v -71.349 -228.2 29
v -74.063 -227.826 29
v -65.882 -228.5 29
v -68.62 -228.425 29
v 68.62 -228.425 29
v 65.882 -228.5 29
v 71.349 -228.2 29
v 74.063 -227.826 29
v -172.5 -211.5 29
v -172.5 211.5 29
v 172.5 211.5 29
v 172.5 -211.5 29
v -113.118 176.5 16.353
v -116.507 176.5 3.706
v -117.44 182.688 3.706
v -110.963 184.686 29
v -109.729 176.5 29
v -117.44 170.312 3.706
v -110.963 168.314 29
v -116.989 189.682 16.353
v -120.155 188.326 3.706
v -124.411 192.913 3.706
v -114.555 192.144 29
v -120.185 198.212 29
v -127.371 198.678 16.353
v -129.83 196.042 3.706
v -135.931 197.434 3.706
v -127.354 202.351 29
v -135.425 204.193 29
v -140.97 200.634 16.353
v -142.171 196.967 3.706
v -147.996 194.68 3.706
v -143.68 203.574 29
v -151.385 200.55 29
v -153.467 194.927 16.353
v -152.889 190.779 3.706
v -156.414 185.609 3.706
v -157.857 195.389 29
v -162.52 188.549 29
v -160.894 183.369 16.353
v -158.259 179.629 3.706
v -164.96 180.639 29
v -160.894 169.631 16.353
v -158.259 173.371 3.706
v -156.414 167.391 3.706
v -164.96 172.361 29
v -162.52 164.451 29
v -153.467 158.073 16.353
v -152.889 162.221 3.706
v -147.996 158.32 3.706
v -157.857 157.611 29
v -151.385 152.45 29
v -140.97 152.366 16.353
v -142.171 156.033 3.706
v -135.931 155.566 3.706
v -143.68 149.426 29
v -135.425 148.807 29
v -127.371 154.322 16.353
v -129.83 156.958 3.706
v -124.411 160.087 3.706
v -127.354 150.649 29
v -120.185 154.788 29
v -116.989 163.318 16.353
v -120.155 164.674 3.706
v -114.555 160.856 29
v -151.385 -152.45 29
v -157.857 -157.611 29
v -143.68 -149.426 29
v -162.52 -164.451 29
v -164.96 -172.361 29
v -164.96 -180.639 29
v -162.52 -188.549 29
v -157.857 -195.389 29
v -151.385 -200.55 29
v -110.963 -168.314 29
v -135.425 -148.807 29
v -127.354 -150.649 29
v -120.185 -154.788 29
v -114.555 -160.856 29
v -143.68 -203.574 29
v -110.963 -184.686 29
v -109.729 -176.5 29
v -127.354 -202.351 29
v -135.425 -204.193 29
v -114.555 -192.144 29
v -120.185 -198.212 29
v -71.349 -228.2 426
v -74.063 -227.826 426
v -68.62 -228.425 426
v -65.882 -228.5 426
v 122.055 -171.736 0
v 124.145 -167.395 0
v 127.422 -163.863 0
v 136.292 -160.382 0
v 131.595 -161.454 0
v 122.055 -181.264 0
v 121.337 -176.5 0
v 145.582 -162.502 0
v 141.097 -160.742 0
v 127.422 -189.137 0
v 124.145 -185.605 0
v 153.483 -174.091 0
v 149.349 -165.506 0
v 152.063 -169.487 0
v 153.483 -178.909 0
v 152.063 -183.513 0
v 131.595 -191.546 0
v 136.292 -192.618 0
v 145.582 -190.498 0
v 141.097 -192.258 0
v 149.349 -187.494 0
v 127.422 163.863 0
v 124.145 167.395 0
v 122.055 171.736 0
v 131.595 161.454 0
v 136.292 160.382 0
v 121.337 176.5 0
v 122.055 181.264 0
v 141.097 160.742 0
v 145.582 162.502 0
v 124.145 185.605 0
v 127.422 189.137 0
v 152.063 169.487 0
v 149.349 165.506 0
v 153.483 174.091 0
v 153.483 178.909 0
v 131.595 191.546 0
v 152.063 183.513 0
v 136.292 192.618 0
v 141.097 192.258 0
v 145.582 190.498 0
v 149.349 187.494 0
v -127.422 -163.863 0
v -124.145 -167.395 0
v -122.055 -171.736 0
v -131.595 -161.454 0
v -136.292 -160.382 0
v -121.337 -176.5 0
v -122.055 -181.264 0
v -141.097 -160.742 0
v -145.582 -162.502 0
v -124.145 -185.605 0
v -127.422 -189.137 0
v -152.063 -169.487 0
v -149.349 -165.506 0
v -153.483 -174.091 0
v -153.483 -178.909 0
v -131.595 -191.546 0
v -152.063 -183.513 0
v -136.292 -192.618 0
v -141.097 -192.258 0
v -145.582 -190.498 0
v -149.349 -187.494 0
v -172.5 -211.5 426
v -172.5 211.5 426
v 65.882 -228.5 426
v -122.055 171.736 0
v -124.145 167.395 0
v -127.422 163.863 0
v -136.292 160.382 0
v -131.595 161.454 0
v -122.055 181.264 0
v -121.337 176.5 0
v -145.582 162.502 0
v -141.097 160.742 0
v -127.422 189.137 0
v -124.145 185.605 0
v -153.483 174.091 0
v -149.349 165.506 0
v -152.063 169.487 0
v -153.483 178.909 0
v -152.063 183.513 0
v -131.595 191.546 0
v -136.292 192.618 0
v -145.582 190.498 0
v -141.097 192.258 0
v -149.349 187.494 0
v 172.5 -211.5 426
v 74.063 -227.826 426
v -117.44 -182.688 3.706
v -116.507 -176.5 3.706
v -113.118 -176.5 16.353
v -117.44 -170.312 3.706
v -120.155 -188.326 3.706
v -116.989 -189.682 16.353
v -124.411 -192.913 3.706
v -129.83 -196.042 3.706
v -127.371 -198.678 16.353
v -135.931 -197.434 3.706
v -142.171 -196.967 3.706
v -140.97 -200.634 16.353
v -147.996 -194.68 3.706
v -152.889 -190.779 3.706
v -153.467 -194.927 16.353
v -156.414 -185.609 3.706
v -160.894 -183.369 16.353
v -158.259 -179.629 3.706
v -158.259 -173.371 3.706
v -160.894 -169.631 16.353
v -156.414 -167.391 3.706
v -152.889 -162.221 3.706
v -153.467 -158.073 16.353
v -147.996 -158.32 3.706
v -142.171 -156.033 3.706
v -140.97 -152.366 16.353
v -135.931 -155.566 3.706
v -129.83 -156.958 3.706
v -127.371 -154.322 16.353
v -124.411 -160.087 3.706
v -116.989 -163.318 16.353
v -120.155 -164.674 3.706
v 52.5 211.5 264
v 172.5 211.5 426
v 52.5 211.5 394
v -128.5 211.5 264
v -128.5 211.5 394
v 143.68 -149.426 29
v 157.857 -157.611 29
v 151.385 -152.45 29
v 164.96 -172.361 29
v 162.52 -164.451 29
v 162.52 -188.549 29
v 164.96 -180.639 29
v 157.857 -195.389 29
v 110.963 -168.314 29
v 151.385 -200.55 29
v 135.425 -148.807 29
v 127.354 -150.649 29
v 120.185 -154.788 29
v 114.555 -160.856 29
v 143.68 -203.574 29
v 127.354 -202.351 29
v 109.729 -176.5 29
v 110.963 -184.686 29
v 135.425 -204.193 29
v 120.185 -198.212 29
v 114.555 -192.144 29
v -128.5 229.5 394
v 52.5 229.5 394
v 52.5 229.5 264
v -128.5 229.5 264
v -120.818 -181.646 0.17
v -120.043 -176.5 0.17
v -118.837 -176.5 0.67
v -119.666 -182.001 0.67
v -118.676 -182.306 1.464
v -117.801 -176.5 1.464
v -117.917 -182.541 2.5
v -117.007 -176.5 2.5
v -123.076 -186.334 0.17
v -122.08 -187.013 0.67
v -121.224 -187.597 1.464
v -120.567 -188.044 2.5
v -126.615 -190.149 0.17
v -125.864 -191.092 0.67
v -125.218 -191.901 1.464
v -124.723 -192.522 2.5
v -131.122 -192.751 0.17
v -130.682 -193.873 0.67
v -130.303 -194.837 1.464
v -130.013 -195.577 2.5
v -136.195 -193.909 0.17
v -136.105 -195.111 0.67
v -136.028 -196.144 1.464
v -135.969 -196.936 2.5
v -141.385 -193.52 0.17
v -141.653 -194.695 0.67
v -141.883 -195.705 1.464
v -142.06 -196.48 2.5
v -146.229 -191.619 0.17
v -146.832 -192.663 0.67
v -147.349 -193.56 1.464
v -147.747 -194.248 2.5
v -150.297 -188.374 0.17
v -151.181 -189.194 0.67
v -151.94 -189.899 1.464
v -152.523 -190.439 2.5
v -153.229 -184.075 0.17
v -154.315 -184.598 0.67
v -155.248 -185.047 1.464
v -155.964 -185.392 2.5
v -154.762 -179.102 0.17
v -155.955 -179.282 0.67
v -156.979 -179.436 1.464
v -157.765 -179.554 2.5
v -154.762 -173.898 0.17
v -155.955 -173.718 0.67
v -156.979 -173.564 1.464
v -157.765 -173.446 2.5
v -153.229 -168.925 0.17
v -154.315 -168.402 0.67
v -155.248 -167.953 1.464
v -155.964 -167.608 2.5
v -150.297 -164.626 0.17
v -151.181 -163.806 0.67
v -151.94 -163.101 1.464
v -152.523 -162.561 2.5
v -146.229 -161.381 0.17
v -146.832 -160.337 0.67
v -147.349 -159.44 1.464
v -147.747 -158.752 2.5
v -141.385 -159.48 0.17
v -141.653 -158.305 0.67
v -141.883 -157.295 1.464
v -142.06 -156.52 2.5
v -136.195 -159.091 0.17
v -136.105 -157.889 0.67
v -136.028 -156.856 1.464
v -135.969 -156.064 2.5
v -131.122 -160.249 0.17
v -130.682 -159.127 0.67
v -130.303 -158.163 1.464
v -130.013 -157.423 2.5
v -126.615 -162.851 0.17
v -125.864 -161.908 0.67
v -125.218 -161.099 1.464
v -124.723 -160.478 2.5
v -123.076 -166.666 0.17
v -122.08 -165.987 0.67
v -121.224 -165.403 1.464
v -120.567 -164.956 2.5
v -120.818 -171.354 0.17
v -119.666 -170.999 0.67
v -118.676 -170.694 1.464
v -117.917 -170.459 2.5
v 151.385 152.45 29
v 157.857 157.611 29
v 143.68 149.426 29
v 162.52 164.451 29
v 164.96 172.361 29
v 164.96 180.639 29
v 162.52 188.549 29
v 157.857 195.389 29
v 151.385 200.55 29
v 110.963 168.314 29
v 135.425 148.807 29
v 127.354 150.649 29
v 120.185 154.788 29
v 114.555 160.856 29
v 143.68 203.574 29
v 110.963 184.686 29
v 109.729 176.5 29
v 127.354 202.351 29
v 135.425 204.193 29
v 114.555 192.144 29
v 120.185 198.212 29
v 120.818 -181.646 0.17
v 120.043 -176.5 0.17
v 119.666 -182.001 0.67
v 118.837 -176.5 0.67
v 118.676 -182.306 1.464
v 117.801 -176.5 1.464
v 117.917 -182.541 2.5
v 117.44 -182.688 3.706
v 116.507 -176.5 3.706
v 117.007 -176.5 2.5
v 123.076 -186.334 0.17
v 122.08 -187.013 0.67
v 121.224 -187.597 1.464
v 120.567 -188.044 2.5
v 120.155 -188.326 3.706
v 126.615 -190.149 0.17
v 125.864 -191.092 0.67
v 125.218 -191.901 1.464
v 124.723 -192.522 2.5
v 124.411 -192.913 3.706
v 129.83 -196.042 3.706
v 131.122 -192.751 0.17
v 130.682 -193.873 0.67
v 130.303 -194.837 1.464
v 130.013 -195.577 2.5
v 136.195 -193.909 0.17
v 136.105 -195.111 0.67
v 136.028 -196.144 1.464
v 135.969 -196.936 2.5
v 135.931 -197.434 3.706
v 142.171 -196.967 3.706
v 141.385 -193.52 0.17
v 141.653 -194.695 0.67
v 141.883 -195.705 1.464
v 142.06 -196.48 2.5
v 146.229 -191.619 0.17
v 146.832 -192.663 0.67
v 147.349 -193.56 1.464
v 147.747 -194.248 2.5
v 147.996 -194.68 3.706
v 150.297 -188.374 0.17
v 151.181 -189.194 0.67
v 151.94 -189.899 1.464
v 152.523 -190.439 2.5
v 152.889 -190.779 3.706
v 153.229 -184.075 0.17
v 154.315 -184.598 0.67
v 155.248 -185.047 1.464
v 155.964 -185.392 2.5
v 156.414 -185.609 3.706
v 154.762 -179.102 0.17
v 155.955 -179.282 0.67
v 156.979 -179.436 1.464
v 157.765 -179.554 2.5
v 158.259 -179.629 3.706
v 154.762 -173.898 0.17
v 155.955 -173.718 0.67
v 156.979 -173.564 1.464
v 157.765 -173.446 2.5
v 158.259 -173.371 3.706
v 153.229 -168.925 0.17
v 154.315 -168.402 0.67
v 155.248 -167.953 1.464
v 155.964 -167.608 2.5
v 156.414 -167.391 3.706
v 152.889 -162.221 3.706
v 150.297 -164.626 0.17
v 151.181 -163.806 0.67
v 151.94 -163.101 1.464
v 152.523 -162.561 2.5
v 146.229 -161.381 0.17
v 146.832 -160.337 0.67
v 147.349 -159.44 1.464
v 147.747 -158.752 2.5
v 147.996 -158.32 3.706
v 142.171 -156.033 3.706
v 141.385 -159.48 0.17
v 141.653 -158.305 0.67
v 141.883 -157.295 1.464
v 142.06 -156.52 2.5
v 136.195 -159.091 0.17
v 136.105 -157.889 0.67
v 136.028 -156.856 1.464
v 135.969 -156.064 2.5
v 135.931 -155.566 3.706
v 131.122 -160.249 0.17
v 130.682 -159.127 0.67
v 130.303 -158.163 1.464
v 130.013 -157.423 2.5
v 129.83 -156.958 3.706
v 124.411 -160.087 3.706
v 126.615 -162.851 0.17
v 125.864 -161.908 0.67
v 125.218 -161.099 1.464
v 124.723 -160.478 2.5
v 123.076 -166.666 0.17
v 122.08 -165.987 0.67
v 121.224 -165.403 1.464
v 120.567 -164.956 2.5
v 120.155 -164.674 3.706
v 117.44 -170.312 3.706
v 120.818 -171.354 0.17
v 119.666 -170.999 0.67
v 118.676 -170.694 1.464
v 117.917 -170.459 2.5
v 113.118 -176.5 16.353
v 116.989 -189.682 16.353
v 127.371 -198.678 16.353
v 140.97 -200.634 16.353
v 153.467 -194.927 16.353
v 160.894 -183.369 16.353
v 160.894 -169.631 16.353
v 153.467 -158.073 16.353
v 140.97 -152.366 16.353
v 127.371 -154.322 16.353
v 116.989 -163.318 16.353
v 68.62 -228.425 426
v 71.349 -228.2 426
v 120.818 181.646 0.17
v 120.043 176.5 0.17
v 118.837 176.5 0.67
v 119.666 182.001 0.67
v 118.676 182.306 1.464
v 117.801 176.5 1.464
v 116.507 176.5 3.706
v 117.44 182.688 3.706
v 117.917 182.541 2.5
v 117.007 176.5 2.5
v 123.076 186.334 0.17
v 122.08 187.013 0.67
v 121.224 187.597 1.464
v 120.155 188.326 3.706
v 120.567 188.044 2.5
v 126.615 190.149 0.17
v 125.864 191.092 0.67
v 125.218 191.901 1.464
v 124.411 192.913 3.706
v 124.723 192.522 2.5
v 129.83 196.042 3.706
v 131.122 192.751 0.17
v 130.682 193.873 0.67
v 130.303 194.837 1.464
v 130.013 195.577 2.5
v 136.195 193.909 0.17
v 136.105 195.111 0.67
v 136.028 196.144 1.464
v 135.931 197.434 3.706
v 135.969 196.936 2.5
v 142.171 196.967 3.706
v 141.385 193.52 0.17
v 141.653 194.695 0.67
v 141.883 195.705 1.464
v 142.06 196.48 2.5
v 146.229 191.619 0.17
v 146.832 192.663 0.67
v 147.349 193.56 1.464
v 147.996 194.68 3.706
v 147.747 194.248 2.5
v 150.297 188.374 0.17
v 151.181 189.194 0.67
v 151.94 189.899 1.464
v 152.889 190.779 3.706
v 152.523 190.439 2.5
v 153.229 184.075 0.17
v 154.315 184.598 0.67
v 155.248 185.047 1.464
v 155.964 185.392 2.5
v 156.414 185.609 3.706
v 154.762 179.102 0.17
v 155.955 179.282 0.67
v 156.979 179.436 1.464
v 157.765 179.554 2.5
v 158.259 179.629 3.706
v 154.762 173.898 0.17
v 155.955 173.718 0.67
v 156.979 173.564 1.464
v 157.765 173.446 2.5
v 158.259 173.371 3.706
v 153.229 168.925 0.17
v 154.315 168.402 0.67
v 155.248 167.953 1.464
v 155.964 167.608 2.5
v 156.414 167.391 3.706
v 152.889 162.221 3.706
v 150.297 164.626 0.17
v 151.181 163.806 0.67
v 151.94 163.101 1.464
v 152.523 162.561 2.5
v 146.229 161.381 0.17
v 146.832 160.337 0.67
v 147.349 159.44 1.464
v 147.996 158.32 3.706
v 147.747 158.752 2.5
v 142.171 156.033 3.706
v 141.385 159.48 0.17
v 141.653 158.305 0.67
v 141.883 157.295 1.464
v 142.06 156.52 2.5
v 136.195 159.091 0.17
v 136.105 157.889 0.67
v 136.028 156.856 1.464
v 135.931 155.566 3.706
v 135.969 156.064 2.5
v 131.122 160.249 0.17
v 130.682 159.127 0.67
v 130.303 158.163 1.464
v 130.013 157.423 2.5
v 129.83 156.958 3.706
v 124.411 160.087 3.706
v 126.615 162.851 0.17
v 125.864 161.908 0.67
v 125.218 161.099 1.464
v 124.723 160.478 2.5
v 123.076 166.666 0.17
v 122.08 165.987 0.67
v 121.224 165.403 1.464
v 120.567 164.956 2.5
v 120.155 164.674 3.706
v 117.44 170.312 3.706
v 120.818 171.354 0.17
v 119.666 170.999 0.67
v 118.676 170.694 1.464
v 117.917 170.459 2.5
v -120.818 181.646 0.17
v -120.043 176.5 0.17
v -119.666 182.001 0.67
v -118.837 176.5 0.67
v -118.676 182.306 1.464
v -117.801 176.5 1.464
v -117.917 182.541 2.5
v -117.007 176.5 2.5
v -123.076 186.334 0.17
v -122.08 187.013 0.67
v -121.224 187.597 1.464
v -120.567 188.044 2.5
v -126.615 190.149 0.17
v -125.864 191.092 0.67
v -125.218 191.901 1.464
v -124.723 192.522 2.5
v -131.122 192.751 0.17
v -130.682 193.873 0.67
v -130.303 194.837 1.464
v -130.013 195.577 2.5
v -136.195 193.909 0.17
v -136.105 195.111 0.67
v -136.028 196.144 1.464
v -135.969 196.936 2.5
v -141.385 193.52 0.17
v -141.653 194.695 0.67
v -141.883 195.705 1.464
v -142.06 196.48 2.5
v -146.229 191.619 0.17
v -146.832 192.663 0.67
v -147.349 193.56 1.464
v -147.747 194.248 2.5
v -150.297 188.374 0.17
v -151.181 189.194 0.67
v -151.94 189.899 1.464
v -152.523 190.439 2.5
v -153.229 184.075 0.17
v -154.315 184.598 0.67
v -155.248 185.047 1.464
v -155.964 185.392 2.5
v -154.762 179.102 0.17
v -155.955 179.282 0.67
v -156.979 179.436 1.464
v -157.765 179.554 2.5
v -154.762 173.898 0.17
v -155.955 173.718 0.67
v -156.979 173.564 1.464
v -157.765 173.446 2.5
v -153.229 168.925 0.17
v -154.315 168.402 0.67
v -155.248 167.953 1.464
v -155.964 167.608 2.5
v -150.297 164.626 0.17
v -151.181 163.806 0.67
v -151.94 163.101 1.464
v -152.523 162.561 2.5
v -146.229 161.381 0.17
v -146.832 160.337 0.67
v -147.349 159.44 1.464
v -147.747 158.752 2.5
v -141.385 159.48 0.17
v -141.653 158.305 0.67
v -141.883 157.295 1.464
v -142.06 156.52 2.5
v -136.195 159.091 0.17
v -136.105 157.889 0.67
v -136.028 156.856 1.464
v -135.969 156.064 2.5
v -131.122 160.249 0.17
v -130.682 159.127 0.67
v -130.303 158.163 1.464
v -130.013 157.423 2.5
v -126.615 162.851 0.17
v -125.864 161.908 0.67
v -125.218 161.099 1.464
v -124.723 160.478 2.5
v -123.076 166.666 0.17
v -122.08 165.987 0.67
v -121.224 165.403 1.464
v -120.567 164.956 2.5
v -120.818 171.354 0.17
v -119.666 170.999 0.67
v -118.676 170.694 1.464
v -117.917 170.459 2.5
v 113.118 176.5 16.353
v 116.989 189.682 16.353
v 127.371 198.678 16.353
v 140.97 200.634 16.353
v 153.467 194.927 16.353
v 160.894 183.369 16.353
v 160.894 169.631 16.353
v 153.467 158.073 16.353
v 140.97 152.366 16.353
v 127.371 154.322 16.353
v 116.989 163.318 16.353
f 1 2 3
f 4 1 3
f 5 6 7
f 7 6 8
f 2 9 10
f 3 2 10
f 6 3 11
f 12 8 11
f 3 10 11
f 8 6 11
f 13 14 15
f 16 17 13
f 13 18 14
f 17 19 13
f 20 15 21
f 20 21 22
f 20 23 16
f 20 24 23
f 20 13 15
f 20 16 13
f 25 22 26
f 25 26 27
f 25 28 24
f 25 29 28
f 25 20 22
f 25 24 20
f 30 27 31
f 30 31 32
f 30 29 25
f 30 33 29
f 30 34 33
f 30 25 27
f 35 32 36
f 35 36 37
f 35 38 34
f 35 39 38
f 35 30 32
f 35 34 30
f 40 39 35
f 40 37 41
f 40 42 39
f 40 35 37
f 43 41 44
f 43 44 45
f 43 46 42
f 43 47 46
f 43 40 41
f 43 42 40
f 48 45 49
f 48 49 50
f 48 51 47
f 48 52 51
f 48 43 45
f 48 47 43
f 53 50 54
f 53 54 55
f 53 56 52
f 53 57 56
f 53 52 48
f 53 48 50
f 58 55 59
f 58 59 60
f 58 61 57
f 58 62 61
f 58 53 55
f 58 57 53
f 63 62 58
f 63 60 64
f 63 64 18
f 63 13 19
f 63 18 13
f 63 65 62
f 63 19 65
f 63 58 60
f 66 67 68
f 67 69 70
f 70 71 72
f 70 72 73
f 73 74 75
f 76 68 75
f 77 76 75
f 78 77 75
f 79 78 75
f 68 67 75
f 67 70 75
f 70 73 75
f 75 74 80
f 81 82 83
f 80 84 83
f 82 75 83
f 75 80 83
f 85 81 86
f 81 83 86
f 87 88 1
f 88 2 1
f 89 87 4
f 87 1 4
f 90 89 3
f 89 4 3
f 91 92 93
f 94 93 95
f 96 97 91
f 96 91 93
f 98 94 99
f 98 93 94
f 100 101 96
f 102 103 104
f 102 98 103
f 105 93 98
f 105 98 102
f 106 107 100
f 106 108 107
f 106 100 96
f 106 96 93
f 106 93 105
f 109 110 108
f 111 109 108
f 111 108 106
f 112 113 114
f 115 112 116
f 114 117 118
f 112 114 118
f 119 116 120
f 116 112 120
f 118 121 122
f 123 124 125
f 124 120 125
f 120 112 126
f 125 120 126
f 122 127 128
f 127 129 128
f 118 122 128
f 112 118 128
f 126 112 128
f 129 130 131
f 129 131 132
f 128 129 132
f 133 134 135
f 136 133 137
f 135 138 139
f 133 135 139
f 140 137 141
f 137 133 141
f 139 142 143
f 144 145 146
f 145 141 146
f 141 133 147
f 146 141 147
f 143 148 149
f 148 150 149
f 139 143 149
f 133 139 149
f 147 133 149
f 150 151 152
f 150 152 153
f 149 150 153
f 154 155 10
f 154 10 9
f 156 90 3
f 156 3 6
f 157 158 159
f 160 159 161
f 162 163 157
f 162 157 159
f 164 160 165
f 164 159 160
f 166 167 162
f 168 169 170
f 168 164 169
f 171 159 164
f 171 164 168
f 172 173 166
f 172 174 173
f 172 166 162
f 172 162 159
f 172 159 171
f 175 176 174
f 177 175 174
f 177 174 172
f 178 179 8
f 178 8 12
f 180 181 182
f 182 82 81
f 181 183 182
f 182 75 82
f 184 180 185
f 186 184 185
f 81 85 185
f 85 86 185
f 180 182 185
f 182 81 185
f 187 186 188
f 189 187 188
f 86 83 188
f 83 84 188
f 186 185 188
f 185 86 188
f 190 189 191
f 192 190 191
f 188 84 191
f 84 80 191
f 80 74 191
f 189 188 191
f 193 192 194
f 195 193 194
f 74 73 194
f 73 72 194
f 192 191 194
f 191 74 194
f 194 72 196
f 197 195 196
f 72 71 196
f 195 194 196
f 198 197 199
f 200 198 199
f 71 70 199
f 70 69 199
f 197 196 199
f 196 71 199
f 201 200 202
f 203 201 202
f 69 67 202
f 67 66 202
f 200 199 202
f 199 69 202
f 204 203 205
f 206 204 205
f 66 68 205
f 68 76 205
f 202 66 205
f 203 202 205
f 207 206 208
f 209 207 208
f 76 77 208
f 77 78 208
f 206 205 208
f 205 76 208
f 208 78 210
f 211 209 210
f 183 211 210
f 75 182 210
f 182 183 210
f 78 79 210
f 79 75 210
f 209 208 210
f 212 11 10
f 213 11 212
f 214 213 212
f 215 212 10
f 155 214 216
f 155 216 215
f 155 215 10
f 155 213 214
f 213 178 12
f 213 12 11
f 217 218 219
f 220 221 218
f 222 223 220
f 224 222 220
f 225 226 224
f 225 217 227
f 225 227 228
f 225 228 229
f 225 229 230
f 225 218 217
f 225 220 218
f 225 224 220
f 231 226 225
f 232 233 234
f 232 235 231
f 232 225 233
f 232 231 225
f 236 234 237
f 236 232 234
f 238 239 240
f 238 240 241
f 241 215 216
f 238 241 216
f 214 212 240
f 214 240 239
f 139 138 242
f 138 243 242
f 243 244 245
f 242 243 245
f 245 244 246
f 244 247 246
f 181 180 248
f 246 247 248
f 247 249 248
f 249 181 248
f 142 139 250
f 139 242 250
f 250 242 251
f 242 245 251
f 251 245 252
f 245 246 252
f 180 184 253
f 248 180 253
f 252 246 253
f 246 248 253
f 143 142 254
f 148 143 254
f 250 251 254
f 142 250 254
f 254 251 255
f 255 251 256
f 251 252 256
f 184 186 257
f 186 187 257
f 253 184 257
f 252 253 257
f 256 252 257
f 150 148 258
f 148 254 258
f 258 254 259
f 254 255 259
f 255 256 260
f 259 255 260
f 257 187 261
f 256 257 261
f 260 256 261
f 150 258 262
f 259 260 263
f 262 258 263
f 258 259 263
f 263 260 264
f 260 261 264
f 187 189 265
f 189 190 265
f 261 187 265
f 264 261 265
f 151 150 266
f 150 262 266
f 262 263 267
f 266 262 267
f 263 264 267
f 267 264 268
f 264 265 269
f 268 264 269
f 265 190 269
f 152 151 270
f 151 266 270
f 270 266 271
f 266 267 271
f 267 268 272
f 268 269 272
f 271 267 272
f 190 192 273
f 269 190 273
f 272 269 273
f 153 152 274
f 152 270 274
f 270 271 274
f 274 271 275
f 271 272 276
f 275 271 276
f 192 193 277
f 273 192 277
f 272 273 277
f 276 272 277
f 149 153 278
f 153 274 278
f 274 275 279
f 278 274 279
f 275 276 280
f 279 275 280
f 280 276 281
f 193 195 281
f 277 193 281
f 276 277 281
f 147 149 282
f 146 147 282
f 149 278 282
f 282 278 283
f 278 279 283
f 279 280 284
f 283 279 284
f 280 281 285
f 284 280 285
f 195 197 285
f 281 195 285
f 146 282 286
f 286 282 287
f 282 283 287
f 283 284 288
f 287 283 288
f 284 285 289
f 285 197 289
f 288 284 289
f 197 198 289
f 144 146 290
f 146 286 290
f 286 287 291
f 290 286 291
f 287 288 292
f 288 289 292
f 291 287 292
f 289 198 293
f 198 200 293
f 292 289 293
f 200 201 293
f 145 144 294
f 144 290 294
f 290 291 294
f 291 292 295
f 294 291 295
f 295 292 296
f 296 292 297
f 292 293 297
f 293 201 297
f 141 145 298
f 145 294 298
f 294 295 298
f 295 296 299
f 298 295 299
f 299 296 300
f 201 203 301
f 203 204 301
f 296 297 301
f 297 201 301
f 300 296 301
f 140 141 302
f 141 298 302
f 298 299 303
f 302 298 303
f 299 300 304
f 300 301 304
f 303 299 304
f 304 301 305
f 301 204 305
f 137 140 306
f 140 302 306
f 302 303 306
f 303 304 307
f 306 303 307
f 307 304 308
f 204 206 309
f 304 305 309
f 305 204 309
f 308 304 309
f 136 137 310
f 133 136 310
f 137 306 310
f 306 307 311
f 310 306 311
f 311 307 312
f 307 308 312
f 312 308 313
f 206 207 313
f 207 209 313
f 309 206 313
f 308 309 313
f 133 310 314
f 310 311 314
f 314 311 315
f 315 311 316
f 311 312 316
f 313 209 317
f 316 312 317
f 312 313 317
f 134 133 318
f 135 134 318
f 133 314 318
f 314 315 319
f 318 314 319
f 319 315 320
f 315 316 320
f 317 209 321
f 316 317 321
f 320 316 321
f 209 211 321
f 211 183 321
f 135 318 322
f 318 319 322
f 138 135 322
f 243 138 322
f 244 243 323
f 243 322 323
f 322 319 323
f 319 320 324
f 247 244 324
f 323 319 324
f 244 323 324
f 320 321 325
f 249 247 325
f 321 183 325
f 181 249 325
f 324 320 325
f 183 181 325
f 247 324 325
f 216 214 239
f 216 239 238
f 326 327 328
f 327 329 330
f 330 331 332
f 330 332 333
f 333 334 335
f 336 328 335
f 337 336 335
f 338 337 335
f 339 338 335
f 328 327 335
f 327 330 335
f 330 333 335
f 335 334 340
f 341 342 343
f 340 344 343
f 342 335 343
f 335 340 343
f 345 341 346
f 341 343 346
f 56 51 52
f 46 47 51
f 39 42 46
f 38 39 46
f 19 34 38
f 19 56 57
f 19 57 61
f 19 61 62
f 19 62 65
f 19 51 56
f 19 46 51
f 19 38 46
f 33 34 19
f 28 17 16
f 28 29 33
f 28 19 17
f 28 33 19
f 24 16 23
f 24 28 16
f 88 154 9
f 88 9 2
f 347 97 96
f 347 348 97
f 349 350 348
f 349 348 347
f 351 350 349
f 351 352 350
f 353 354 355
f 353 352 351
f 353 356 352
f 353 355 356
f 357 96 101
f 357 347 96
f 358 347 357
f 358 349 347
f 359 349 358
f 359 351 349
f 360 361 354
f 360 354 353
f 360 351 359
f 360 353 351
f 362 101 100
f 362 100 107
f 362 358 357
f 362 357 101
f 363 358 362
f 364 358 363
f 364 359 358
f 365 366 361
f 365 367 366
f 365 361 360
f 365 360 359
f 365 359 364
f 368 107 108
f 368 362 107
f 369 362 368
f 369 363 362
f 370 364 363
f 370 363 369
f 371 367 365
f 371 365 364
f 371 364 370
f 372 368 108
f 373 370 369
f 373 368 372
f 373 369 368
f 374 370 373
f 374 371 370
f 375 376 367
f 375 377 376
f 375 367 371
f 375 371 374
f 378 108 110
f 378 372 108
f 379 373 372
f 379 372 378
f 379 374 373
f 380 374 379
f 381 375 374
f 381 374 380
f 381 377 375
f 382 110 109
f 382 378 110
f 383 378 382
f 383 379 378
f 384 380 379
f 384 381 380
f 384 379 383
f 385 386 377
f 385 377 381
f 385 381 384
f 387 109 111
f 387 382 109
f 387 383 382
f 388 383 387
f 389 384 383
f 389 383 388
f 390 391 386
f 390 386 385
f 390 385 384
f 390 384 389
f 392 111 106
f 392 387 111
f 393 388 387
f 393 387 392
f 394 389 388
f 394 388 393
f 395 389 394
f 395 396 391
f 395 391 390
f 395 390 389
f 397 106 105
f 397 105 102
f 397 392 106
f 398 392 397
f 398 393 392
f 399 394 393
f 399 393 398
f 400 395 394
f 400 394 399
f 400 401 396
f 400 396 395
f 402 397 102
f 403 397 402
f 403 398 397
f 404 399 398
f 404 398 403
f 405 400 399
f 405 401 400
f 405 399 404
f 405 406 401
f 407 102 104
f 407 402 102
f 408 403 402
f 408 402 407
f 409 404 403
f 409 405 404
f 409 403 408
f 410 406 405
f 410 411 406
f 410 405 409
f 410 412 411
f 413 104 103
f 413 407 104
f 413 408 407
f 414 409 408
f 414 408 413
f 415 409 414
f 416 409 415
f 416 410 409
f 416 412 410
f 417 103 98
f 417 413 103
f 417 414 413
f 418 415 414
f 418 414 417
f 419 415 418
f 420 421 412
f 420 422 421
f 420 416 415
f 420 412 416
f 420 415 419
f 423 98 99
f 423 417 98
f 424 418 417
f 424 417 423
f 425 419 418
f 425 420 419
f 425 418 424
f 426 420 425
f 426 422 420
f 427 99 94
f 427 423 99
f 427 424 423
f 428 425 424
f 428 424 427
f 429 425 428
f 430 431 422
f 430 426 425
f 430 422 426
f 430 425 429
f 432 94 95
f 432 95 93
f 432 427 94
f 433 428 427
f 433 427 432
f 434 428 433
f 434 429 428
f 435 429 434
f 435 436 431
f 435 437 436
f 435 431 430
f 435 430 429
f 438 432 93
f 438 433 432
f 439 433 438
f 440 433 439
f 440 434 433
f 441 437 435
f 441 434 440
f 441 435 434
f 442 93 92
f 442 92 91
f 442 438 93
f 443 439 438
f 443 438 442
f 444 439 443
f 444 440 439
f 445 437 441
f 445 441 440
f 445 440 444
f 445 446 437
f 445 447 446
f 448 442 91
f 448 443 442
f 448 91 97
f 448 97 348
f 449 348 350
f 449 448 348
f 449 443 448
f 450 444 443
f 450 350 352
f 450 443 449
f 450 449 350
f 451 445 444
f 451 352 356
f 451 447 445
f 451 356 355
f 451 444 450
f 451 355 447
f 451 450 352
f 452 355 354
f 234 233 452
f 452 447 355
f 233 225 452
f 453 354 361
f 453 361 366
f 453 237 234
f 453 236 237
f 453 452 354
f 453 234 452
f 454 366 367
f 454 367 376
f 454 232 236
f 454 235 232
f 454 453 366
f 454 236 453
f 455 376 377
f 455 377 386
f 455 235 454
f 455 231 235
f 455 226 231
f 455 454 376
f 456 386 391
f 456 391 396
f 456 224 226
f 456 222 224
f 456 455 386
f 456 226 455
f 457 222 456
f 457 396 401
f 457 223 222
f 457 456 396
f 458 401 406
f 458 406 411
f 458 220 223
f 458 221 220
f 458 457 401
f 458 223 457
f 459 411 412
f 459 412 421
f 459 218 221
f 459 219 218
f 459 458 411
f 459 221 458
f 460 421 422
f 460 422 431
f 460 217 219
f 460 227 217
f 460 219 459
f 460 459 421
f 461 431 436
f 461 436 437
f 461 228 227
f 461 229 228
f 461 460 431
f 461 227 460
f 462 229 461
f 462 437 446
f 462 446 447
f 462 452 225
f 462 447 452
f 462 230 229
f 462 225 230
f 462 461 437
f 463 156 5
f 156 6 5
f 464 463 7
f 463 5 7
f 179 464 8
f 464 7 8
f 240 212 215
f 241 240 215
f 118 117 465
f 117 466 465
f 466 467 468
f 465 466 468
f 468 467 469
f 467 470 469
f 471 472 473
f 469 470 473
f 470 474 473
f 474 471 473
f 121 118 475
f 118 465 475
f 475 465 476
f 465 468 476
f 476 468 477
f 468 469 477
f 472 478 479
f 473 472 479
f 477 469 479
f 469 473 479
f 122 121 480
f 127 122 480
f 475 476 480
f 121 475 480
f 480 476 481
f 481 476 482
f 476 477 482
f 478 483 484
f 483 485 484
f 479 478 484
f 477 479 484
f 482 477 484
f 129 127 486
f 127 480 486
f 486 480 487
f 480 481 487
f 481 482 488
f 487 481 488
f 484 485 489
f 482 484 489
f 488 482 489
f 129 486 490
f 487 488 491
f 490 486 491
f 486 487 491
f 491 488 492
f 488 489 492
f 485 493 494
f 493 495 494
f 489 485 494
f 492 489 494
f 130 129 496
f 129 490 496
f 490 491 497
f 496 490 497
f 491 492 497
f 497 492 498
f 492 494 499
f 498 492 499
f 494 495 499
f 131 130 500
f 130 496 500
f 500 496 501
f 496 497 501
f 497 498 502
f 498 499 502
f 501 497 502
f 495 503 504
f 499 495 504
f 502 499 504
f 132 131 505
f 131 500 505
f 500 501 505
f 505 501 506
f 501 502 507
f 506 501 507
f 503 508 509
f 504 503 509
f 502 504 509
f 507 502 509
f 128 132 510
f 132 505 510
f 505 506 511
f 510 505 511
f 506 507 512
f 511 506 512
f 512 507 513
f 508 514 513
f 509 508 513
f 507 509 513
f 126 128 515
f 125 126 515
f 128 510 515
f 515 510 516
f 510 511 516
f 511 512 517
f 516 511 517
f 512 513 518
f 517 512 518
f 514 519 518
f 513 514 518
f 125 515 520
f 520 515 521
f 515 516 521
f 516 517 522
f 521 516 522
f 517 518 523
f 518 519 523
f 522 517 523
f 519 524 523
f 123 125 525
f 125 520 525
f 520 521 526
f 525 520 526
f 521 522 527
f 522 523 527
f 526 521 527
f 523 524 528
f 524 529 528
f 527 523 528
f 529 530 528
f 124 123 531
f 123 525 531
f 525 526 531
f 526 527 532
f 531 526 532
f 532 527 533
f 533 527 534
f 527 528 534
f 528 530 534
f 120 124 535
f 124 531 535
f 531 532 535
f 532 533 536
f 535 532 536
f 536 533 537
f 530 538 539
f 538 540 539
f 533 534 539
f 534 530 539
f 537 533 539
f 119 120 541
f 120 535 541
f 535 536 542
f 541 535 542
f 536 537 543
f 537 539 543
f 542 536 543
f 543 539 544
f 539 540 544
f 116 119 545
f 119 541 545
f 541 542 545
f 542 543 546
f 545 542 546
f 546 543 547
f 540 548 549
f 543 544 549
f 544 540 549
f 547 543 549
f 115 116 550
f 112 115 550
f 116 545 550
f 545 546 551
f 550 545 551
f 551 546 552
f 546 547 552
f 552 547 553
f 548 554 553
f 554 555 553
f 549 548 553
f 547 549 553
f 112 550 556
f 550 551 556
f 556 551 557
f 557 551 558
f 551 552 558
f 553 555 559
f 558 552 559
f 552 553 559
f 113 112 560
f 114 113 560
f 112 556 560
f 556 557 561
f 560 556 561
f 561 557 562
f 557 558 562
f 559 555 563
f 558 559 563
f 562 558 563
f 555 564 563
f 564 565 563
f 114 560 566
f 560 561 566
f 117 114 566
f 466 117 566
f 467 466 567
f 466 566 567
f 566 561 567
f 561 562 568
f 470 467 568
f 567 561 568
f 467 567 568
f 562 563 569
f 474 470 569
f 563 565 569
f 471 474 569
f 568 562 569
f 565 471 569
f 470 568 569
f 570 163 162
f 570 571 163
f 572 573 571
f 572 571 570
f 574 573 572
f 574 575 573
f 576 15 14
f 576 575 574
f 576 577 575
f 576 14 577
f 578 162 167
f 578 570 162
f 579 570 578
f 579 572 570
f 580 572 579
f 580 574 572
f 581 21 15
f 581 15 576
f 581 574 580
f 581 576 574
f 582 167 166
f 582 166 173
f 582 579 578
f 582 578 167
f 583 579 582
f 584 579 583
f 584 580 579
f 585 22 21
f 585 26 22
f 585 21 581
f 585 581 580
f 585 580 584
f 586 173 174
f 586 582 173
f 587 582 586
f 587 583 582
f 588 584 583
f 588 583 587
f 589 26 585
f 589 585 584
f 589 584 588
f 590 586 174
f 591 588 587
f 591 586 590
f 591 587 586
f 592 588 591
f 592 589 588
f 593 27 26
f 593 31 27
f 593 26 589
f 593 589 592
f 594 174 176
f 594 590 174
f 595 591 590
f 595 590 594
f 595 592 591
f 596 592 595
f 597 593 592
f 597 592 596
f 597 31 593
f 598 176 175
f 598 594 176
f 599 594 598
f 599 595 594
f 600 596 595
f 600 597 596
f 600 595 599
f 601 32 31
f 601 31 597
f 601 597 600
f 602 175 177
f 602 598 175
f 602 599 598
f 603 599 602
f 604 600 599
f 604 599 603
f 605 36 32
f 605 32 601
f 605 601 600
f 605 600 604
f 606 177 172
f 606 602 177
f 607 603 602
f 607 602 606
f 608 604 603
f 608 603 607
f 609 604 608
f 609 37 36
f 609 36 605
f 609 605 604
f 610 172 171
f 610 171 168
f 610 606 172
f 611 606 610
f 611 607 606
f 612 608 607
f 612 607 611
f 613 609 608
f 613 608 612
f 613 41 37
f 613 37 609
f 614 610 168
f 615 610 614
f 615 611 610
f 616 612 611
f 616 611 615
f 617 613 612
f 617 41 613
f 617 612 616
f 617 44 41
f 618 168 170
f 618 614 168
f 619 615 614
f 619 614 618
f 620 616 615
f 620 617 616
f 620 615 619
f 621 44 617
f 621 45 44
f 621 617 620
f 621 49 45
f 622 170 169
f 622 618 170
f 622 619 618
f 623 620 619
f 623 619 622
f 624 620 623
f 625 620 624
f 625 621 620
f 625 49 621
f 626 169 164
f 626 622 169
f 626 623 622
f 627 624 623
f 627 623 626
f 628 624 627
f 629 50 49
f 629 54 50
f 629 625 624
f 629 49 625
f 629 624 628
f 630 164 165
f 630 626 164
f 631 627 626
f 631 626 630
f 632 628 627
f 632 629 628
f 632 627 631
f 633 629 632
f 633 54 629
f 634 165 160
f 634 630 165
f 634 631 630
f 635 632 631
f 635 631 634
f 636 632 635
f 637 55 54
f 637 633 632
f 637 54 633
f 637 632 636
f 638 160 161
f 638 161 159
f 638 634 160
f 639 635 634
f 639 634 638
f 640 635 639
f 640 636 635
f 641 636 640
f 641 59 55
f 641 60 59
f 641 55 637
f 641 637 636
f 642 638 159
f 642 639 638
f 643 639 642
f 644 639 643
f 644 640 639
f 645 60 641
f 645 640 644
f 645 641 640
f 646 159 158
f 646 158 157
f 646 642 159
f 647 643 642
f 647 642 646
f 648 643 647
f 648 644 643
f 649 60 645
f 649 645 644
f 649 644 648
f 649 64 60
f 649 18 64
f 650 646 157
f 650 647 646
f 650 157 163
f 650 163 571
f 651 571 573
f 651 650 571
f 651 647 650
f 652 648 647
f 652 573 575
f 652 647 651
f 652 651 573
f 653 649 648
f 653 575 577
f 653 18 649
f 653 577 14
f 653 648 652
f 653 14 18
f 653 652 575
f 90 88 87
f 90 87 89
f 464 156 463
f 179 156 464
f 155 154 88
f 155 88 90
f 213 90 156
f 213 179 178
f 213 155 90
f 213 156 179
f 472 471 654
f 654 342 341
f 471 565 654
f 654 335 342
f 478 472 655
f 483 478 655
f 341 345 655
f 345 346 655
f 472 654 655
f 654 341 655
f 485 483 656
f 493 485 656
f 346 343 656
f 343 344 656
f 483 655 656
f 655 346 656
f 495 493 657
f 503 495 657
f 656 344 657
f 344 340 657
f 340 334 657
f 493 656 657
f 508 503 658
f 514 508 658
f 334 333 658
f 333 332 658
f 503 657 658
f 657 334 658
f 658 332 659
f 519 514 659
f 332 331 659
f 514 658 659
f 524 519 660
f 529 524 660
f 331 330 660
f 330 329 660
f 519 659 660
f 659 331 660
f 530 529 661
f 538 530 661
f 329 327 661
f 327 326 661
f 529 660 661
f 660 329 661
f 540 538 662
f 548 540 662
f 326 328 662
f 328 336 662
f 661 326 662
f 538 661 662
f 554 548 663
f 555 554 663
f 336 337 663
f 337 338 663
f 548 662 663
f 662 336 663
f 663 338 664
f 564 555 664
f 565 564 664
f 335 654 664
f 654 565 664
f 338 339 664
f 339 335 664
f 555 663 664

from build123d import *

# Parameters (mm, degrees)
F3_DEPTH  = 397
F4_R      = 50
F11_W     = 181
F11_H     = 130
F12_DEPTH = 18


with BuildPart() as f3:
    # F2 (on offset) → F3 (new body, through all)
    with BuildSketch(Plane.XY.offset(426)):
        Polygon((172.5, 211.5), (-172.5, 211.5), (-172.5, -211.5), (-70, -228.5), (70, -228.5), (172.5, -211.5), align=None)
    extrude(amount=-F3_DEPTH)

    # F4
    f4_edges = [f3.edges().sort_by_distance(p)[0] for p in [
        (-70, -228.5, 227.5),
        (70, -228.5, 227.5),
    ]]
    fillet(f4_edges, radius=F4_R)

    # F11 (on face) → F12 (join)
    with BuildSketch(Plane(origin=(0, 211.5, 0), x_dir=(-1, 0, 0), z_dir=(0, 1, 0))):
        with Locations((38, 329)):
            Rectangle(F11_W, F11_H)
    extrude(amount=F12_DEPTH)


with BuildPart() as f8:
    # F7 (on plane+point) → F8 (revolve)
    with BuildSketch(Plane.XZ.offset(-176.5)):
        with BuildLine():
            Line((-116.5070058084, 3.7059047745), (-109.7294734195, 29))
            Line((-109.7294734195, 29), (-137.5, 29))
            Line((-137.5, 29), (-137.5, 0))
            Line((-137.5, 0), (-121.3366349399, 0))
            ThreePointArc((-121.3366349399, 0), (-118.2928277949, 1.0332332985), (-116.5070058084, 3.7059047745))
        make_face()
    revolve(axis=Axis((-137.5, 176.5, 14.5), (0, 0, 1)))


with BuildPart() as f9_1:
    # F9: instance of F8
    add(f8.part.mirror(Plane.YZ))


with BuildPart() as f10_1:
    # F10: instance of F8
    add(f8.part.mirror(Plane.XZ))


with BuildPart() as f10_2:
    # F10: instance of F9_1
    add(f9_1.part.mirror(Plane.XZ))


solid = Compound([f3.part, f8.part, f9_1.part, f10_1.part, f10_2.part])
